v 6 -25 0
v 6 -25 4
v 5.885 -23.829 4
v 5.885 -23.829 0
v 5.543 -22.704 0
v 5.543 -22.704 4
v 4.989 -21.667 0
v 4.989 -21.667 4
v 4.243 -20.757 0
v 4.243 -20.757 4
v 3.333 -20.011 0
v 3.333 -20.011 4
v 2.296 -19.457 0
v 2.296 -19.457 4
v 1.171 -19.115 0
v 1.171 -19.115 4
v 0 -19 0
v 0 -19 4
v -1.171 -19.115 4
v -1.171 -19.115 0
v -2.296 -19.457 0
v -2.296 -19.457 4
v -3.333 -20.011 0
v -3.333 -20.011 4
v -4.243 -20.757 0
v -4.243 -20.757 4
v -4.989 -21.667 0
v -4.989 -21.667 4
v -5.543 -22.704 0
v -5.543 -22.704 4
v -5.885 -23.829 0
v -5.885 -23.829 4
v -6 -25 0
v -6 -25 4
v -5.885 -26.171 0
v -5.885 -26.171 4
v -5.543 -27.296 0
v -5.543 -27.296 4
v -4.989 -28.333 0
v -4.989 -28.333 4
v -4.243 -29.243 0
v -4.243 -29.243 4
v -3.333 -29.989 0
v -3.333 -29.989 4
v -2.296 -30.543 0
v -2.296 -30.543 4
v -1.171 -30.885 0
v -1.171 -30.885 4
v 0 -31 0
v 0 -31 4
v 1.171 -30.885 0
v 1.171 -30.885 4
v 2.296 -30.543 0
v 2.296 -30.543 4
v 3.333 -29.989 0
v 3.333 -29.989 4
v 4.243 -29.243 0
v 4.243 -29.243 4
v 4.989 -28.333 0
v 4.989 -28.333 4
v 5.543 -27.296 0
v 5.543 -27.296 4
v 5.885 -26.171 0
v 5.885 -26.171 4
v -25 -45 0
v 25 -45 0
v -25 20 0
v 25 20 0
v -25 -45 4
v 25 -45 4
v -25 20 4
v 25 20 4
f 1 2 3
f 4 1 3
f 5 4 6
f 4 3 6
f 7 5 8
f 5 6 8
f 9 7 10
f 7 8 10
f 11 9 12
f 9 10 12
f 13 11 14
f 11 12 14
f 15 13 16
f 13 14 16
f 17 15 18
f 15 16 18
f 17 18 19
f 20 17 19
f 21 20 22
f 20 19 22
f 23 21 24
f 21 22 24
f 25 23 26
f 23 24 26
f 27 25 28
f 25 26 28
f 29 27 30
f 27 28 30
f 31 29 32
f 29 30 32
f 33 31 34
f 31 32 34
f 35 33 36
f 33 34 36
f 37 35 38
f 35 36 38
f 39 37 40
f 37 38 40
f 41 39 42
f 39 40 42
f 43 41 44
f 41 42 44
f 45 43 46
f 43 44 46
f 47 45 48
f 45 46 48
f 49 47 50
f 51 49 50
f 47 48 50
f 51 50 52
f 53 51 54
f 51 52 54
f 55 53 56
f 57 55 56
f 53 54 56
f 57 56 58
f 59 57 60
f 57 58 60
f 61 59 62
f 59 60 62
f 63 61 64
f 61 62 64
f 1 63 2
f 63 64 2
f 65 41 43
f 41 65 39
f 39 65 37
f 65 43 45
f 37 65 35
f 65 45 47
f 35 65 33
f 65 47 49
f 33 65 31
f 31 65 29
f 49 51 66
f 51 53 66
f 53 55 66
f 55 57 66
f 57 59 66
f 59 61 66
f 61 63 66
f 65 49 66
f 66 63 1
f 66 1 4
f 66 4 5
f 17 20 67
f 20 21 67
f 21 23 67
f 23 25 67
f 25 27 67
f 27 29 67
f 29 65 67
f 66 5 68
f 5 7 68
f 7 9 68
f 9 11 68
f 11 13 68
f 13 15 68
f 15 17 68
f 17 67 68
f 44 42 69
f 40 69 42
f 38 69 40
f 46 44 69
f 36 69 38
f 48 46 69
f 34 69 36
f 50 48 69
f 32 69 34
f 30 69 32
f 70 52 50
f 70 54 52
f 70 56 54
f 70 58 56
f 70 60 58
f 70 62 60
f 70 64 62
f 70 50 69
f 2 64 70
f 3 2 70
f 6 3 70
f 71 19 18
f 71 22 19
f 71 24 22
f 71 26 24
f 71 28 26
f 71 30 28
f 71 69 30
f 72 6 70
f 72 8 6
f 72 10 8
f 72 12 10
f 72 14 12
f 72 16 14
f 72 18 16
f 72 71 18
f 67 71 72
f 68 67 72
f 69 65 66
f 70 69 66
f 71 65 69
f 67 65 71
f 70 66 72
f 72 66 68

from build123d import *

# Parameters (mm, degrees)
SKETCH2_W           = 50
SKETCH2_H           = 90
BOSS_EXTRUDE1_DEPTH = 4
SKETCH3_R           = 6
CUT_EXTRUDE1_DEPTH  = 4
SKETCH4_W           = 50
SKETCH4_H           = 25
CUT_EXTRUDE2_DEPTH  = 10


with BuildPart() as part:
    # Sketch2 → Boss-Extrude1 (new body)
    with BuildSketch(Plane.XY):
        Rectangle(SKETCH2_W, SKETCH2_H)
    extrude(amount=BOSS_EXTRUDE1_DEPTH)

    # Sketch3 → Cut-Extrude1 (cut)
    with BuildSketch(Plane.XY.offset(4)):
        with Locations((0, -25)):
            Circle(SKETCH3_R)
    extrude(amount=-CUT_EXTRUDE1_DEPTH, mode=Mode.SUBTRACT)

    # Sketch4 → Cut-Extrude2 (cut)
    with BuildSketch(Plane.XY.offset(4)):
        with Locations((0, 32.5)):
            Rectangle(SKETCH4_W, SKETCH4_H)
    extrude(amount=-CUT_EXTRUDE2_DEPTH, mode=Mode.SUBTRACT)


solid = part.part
